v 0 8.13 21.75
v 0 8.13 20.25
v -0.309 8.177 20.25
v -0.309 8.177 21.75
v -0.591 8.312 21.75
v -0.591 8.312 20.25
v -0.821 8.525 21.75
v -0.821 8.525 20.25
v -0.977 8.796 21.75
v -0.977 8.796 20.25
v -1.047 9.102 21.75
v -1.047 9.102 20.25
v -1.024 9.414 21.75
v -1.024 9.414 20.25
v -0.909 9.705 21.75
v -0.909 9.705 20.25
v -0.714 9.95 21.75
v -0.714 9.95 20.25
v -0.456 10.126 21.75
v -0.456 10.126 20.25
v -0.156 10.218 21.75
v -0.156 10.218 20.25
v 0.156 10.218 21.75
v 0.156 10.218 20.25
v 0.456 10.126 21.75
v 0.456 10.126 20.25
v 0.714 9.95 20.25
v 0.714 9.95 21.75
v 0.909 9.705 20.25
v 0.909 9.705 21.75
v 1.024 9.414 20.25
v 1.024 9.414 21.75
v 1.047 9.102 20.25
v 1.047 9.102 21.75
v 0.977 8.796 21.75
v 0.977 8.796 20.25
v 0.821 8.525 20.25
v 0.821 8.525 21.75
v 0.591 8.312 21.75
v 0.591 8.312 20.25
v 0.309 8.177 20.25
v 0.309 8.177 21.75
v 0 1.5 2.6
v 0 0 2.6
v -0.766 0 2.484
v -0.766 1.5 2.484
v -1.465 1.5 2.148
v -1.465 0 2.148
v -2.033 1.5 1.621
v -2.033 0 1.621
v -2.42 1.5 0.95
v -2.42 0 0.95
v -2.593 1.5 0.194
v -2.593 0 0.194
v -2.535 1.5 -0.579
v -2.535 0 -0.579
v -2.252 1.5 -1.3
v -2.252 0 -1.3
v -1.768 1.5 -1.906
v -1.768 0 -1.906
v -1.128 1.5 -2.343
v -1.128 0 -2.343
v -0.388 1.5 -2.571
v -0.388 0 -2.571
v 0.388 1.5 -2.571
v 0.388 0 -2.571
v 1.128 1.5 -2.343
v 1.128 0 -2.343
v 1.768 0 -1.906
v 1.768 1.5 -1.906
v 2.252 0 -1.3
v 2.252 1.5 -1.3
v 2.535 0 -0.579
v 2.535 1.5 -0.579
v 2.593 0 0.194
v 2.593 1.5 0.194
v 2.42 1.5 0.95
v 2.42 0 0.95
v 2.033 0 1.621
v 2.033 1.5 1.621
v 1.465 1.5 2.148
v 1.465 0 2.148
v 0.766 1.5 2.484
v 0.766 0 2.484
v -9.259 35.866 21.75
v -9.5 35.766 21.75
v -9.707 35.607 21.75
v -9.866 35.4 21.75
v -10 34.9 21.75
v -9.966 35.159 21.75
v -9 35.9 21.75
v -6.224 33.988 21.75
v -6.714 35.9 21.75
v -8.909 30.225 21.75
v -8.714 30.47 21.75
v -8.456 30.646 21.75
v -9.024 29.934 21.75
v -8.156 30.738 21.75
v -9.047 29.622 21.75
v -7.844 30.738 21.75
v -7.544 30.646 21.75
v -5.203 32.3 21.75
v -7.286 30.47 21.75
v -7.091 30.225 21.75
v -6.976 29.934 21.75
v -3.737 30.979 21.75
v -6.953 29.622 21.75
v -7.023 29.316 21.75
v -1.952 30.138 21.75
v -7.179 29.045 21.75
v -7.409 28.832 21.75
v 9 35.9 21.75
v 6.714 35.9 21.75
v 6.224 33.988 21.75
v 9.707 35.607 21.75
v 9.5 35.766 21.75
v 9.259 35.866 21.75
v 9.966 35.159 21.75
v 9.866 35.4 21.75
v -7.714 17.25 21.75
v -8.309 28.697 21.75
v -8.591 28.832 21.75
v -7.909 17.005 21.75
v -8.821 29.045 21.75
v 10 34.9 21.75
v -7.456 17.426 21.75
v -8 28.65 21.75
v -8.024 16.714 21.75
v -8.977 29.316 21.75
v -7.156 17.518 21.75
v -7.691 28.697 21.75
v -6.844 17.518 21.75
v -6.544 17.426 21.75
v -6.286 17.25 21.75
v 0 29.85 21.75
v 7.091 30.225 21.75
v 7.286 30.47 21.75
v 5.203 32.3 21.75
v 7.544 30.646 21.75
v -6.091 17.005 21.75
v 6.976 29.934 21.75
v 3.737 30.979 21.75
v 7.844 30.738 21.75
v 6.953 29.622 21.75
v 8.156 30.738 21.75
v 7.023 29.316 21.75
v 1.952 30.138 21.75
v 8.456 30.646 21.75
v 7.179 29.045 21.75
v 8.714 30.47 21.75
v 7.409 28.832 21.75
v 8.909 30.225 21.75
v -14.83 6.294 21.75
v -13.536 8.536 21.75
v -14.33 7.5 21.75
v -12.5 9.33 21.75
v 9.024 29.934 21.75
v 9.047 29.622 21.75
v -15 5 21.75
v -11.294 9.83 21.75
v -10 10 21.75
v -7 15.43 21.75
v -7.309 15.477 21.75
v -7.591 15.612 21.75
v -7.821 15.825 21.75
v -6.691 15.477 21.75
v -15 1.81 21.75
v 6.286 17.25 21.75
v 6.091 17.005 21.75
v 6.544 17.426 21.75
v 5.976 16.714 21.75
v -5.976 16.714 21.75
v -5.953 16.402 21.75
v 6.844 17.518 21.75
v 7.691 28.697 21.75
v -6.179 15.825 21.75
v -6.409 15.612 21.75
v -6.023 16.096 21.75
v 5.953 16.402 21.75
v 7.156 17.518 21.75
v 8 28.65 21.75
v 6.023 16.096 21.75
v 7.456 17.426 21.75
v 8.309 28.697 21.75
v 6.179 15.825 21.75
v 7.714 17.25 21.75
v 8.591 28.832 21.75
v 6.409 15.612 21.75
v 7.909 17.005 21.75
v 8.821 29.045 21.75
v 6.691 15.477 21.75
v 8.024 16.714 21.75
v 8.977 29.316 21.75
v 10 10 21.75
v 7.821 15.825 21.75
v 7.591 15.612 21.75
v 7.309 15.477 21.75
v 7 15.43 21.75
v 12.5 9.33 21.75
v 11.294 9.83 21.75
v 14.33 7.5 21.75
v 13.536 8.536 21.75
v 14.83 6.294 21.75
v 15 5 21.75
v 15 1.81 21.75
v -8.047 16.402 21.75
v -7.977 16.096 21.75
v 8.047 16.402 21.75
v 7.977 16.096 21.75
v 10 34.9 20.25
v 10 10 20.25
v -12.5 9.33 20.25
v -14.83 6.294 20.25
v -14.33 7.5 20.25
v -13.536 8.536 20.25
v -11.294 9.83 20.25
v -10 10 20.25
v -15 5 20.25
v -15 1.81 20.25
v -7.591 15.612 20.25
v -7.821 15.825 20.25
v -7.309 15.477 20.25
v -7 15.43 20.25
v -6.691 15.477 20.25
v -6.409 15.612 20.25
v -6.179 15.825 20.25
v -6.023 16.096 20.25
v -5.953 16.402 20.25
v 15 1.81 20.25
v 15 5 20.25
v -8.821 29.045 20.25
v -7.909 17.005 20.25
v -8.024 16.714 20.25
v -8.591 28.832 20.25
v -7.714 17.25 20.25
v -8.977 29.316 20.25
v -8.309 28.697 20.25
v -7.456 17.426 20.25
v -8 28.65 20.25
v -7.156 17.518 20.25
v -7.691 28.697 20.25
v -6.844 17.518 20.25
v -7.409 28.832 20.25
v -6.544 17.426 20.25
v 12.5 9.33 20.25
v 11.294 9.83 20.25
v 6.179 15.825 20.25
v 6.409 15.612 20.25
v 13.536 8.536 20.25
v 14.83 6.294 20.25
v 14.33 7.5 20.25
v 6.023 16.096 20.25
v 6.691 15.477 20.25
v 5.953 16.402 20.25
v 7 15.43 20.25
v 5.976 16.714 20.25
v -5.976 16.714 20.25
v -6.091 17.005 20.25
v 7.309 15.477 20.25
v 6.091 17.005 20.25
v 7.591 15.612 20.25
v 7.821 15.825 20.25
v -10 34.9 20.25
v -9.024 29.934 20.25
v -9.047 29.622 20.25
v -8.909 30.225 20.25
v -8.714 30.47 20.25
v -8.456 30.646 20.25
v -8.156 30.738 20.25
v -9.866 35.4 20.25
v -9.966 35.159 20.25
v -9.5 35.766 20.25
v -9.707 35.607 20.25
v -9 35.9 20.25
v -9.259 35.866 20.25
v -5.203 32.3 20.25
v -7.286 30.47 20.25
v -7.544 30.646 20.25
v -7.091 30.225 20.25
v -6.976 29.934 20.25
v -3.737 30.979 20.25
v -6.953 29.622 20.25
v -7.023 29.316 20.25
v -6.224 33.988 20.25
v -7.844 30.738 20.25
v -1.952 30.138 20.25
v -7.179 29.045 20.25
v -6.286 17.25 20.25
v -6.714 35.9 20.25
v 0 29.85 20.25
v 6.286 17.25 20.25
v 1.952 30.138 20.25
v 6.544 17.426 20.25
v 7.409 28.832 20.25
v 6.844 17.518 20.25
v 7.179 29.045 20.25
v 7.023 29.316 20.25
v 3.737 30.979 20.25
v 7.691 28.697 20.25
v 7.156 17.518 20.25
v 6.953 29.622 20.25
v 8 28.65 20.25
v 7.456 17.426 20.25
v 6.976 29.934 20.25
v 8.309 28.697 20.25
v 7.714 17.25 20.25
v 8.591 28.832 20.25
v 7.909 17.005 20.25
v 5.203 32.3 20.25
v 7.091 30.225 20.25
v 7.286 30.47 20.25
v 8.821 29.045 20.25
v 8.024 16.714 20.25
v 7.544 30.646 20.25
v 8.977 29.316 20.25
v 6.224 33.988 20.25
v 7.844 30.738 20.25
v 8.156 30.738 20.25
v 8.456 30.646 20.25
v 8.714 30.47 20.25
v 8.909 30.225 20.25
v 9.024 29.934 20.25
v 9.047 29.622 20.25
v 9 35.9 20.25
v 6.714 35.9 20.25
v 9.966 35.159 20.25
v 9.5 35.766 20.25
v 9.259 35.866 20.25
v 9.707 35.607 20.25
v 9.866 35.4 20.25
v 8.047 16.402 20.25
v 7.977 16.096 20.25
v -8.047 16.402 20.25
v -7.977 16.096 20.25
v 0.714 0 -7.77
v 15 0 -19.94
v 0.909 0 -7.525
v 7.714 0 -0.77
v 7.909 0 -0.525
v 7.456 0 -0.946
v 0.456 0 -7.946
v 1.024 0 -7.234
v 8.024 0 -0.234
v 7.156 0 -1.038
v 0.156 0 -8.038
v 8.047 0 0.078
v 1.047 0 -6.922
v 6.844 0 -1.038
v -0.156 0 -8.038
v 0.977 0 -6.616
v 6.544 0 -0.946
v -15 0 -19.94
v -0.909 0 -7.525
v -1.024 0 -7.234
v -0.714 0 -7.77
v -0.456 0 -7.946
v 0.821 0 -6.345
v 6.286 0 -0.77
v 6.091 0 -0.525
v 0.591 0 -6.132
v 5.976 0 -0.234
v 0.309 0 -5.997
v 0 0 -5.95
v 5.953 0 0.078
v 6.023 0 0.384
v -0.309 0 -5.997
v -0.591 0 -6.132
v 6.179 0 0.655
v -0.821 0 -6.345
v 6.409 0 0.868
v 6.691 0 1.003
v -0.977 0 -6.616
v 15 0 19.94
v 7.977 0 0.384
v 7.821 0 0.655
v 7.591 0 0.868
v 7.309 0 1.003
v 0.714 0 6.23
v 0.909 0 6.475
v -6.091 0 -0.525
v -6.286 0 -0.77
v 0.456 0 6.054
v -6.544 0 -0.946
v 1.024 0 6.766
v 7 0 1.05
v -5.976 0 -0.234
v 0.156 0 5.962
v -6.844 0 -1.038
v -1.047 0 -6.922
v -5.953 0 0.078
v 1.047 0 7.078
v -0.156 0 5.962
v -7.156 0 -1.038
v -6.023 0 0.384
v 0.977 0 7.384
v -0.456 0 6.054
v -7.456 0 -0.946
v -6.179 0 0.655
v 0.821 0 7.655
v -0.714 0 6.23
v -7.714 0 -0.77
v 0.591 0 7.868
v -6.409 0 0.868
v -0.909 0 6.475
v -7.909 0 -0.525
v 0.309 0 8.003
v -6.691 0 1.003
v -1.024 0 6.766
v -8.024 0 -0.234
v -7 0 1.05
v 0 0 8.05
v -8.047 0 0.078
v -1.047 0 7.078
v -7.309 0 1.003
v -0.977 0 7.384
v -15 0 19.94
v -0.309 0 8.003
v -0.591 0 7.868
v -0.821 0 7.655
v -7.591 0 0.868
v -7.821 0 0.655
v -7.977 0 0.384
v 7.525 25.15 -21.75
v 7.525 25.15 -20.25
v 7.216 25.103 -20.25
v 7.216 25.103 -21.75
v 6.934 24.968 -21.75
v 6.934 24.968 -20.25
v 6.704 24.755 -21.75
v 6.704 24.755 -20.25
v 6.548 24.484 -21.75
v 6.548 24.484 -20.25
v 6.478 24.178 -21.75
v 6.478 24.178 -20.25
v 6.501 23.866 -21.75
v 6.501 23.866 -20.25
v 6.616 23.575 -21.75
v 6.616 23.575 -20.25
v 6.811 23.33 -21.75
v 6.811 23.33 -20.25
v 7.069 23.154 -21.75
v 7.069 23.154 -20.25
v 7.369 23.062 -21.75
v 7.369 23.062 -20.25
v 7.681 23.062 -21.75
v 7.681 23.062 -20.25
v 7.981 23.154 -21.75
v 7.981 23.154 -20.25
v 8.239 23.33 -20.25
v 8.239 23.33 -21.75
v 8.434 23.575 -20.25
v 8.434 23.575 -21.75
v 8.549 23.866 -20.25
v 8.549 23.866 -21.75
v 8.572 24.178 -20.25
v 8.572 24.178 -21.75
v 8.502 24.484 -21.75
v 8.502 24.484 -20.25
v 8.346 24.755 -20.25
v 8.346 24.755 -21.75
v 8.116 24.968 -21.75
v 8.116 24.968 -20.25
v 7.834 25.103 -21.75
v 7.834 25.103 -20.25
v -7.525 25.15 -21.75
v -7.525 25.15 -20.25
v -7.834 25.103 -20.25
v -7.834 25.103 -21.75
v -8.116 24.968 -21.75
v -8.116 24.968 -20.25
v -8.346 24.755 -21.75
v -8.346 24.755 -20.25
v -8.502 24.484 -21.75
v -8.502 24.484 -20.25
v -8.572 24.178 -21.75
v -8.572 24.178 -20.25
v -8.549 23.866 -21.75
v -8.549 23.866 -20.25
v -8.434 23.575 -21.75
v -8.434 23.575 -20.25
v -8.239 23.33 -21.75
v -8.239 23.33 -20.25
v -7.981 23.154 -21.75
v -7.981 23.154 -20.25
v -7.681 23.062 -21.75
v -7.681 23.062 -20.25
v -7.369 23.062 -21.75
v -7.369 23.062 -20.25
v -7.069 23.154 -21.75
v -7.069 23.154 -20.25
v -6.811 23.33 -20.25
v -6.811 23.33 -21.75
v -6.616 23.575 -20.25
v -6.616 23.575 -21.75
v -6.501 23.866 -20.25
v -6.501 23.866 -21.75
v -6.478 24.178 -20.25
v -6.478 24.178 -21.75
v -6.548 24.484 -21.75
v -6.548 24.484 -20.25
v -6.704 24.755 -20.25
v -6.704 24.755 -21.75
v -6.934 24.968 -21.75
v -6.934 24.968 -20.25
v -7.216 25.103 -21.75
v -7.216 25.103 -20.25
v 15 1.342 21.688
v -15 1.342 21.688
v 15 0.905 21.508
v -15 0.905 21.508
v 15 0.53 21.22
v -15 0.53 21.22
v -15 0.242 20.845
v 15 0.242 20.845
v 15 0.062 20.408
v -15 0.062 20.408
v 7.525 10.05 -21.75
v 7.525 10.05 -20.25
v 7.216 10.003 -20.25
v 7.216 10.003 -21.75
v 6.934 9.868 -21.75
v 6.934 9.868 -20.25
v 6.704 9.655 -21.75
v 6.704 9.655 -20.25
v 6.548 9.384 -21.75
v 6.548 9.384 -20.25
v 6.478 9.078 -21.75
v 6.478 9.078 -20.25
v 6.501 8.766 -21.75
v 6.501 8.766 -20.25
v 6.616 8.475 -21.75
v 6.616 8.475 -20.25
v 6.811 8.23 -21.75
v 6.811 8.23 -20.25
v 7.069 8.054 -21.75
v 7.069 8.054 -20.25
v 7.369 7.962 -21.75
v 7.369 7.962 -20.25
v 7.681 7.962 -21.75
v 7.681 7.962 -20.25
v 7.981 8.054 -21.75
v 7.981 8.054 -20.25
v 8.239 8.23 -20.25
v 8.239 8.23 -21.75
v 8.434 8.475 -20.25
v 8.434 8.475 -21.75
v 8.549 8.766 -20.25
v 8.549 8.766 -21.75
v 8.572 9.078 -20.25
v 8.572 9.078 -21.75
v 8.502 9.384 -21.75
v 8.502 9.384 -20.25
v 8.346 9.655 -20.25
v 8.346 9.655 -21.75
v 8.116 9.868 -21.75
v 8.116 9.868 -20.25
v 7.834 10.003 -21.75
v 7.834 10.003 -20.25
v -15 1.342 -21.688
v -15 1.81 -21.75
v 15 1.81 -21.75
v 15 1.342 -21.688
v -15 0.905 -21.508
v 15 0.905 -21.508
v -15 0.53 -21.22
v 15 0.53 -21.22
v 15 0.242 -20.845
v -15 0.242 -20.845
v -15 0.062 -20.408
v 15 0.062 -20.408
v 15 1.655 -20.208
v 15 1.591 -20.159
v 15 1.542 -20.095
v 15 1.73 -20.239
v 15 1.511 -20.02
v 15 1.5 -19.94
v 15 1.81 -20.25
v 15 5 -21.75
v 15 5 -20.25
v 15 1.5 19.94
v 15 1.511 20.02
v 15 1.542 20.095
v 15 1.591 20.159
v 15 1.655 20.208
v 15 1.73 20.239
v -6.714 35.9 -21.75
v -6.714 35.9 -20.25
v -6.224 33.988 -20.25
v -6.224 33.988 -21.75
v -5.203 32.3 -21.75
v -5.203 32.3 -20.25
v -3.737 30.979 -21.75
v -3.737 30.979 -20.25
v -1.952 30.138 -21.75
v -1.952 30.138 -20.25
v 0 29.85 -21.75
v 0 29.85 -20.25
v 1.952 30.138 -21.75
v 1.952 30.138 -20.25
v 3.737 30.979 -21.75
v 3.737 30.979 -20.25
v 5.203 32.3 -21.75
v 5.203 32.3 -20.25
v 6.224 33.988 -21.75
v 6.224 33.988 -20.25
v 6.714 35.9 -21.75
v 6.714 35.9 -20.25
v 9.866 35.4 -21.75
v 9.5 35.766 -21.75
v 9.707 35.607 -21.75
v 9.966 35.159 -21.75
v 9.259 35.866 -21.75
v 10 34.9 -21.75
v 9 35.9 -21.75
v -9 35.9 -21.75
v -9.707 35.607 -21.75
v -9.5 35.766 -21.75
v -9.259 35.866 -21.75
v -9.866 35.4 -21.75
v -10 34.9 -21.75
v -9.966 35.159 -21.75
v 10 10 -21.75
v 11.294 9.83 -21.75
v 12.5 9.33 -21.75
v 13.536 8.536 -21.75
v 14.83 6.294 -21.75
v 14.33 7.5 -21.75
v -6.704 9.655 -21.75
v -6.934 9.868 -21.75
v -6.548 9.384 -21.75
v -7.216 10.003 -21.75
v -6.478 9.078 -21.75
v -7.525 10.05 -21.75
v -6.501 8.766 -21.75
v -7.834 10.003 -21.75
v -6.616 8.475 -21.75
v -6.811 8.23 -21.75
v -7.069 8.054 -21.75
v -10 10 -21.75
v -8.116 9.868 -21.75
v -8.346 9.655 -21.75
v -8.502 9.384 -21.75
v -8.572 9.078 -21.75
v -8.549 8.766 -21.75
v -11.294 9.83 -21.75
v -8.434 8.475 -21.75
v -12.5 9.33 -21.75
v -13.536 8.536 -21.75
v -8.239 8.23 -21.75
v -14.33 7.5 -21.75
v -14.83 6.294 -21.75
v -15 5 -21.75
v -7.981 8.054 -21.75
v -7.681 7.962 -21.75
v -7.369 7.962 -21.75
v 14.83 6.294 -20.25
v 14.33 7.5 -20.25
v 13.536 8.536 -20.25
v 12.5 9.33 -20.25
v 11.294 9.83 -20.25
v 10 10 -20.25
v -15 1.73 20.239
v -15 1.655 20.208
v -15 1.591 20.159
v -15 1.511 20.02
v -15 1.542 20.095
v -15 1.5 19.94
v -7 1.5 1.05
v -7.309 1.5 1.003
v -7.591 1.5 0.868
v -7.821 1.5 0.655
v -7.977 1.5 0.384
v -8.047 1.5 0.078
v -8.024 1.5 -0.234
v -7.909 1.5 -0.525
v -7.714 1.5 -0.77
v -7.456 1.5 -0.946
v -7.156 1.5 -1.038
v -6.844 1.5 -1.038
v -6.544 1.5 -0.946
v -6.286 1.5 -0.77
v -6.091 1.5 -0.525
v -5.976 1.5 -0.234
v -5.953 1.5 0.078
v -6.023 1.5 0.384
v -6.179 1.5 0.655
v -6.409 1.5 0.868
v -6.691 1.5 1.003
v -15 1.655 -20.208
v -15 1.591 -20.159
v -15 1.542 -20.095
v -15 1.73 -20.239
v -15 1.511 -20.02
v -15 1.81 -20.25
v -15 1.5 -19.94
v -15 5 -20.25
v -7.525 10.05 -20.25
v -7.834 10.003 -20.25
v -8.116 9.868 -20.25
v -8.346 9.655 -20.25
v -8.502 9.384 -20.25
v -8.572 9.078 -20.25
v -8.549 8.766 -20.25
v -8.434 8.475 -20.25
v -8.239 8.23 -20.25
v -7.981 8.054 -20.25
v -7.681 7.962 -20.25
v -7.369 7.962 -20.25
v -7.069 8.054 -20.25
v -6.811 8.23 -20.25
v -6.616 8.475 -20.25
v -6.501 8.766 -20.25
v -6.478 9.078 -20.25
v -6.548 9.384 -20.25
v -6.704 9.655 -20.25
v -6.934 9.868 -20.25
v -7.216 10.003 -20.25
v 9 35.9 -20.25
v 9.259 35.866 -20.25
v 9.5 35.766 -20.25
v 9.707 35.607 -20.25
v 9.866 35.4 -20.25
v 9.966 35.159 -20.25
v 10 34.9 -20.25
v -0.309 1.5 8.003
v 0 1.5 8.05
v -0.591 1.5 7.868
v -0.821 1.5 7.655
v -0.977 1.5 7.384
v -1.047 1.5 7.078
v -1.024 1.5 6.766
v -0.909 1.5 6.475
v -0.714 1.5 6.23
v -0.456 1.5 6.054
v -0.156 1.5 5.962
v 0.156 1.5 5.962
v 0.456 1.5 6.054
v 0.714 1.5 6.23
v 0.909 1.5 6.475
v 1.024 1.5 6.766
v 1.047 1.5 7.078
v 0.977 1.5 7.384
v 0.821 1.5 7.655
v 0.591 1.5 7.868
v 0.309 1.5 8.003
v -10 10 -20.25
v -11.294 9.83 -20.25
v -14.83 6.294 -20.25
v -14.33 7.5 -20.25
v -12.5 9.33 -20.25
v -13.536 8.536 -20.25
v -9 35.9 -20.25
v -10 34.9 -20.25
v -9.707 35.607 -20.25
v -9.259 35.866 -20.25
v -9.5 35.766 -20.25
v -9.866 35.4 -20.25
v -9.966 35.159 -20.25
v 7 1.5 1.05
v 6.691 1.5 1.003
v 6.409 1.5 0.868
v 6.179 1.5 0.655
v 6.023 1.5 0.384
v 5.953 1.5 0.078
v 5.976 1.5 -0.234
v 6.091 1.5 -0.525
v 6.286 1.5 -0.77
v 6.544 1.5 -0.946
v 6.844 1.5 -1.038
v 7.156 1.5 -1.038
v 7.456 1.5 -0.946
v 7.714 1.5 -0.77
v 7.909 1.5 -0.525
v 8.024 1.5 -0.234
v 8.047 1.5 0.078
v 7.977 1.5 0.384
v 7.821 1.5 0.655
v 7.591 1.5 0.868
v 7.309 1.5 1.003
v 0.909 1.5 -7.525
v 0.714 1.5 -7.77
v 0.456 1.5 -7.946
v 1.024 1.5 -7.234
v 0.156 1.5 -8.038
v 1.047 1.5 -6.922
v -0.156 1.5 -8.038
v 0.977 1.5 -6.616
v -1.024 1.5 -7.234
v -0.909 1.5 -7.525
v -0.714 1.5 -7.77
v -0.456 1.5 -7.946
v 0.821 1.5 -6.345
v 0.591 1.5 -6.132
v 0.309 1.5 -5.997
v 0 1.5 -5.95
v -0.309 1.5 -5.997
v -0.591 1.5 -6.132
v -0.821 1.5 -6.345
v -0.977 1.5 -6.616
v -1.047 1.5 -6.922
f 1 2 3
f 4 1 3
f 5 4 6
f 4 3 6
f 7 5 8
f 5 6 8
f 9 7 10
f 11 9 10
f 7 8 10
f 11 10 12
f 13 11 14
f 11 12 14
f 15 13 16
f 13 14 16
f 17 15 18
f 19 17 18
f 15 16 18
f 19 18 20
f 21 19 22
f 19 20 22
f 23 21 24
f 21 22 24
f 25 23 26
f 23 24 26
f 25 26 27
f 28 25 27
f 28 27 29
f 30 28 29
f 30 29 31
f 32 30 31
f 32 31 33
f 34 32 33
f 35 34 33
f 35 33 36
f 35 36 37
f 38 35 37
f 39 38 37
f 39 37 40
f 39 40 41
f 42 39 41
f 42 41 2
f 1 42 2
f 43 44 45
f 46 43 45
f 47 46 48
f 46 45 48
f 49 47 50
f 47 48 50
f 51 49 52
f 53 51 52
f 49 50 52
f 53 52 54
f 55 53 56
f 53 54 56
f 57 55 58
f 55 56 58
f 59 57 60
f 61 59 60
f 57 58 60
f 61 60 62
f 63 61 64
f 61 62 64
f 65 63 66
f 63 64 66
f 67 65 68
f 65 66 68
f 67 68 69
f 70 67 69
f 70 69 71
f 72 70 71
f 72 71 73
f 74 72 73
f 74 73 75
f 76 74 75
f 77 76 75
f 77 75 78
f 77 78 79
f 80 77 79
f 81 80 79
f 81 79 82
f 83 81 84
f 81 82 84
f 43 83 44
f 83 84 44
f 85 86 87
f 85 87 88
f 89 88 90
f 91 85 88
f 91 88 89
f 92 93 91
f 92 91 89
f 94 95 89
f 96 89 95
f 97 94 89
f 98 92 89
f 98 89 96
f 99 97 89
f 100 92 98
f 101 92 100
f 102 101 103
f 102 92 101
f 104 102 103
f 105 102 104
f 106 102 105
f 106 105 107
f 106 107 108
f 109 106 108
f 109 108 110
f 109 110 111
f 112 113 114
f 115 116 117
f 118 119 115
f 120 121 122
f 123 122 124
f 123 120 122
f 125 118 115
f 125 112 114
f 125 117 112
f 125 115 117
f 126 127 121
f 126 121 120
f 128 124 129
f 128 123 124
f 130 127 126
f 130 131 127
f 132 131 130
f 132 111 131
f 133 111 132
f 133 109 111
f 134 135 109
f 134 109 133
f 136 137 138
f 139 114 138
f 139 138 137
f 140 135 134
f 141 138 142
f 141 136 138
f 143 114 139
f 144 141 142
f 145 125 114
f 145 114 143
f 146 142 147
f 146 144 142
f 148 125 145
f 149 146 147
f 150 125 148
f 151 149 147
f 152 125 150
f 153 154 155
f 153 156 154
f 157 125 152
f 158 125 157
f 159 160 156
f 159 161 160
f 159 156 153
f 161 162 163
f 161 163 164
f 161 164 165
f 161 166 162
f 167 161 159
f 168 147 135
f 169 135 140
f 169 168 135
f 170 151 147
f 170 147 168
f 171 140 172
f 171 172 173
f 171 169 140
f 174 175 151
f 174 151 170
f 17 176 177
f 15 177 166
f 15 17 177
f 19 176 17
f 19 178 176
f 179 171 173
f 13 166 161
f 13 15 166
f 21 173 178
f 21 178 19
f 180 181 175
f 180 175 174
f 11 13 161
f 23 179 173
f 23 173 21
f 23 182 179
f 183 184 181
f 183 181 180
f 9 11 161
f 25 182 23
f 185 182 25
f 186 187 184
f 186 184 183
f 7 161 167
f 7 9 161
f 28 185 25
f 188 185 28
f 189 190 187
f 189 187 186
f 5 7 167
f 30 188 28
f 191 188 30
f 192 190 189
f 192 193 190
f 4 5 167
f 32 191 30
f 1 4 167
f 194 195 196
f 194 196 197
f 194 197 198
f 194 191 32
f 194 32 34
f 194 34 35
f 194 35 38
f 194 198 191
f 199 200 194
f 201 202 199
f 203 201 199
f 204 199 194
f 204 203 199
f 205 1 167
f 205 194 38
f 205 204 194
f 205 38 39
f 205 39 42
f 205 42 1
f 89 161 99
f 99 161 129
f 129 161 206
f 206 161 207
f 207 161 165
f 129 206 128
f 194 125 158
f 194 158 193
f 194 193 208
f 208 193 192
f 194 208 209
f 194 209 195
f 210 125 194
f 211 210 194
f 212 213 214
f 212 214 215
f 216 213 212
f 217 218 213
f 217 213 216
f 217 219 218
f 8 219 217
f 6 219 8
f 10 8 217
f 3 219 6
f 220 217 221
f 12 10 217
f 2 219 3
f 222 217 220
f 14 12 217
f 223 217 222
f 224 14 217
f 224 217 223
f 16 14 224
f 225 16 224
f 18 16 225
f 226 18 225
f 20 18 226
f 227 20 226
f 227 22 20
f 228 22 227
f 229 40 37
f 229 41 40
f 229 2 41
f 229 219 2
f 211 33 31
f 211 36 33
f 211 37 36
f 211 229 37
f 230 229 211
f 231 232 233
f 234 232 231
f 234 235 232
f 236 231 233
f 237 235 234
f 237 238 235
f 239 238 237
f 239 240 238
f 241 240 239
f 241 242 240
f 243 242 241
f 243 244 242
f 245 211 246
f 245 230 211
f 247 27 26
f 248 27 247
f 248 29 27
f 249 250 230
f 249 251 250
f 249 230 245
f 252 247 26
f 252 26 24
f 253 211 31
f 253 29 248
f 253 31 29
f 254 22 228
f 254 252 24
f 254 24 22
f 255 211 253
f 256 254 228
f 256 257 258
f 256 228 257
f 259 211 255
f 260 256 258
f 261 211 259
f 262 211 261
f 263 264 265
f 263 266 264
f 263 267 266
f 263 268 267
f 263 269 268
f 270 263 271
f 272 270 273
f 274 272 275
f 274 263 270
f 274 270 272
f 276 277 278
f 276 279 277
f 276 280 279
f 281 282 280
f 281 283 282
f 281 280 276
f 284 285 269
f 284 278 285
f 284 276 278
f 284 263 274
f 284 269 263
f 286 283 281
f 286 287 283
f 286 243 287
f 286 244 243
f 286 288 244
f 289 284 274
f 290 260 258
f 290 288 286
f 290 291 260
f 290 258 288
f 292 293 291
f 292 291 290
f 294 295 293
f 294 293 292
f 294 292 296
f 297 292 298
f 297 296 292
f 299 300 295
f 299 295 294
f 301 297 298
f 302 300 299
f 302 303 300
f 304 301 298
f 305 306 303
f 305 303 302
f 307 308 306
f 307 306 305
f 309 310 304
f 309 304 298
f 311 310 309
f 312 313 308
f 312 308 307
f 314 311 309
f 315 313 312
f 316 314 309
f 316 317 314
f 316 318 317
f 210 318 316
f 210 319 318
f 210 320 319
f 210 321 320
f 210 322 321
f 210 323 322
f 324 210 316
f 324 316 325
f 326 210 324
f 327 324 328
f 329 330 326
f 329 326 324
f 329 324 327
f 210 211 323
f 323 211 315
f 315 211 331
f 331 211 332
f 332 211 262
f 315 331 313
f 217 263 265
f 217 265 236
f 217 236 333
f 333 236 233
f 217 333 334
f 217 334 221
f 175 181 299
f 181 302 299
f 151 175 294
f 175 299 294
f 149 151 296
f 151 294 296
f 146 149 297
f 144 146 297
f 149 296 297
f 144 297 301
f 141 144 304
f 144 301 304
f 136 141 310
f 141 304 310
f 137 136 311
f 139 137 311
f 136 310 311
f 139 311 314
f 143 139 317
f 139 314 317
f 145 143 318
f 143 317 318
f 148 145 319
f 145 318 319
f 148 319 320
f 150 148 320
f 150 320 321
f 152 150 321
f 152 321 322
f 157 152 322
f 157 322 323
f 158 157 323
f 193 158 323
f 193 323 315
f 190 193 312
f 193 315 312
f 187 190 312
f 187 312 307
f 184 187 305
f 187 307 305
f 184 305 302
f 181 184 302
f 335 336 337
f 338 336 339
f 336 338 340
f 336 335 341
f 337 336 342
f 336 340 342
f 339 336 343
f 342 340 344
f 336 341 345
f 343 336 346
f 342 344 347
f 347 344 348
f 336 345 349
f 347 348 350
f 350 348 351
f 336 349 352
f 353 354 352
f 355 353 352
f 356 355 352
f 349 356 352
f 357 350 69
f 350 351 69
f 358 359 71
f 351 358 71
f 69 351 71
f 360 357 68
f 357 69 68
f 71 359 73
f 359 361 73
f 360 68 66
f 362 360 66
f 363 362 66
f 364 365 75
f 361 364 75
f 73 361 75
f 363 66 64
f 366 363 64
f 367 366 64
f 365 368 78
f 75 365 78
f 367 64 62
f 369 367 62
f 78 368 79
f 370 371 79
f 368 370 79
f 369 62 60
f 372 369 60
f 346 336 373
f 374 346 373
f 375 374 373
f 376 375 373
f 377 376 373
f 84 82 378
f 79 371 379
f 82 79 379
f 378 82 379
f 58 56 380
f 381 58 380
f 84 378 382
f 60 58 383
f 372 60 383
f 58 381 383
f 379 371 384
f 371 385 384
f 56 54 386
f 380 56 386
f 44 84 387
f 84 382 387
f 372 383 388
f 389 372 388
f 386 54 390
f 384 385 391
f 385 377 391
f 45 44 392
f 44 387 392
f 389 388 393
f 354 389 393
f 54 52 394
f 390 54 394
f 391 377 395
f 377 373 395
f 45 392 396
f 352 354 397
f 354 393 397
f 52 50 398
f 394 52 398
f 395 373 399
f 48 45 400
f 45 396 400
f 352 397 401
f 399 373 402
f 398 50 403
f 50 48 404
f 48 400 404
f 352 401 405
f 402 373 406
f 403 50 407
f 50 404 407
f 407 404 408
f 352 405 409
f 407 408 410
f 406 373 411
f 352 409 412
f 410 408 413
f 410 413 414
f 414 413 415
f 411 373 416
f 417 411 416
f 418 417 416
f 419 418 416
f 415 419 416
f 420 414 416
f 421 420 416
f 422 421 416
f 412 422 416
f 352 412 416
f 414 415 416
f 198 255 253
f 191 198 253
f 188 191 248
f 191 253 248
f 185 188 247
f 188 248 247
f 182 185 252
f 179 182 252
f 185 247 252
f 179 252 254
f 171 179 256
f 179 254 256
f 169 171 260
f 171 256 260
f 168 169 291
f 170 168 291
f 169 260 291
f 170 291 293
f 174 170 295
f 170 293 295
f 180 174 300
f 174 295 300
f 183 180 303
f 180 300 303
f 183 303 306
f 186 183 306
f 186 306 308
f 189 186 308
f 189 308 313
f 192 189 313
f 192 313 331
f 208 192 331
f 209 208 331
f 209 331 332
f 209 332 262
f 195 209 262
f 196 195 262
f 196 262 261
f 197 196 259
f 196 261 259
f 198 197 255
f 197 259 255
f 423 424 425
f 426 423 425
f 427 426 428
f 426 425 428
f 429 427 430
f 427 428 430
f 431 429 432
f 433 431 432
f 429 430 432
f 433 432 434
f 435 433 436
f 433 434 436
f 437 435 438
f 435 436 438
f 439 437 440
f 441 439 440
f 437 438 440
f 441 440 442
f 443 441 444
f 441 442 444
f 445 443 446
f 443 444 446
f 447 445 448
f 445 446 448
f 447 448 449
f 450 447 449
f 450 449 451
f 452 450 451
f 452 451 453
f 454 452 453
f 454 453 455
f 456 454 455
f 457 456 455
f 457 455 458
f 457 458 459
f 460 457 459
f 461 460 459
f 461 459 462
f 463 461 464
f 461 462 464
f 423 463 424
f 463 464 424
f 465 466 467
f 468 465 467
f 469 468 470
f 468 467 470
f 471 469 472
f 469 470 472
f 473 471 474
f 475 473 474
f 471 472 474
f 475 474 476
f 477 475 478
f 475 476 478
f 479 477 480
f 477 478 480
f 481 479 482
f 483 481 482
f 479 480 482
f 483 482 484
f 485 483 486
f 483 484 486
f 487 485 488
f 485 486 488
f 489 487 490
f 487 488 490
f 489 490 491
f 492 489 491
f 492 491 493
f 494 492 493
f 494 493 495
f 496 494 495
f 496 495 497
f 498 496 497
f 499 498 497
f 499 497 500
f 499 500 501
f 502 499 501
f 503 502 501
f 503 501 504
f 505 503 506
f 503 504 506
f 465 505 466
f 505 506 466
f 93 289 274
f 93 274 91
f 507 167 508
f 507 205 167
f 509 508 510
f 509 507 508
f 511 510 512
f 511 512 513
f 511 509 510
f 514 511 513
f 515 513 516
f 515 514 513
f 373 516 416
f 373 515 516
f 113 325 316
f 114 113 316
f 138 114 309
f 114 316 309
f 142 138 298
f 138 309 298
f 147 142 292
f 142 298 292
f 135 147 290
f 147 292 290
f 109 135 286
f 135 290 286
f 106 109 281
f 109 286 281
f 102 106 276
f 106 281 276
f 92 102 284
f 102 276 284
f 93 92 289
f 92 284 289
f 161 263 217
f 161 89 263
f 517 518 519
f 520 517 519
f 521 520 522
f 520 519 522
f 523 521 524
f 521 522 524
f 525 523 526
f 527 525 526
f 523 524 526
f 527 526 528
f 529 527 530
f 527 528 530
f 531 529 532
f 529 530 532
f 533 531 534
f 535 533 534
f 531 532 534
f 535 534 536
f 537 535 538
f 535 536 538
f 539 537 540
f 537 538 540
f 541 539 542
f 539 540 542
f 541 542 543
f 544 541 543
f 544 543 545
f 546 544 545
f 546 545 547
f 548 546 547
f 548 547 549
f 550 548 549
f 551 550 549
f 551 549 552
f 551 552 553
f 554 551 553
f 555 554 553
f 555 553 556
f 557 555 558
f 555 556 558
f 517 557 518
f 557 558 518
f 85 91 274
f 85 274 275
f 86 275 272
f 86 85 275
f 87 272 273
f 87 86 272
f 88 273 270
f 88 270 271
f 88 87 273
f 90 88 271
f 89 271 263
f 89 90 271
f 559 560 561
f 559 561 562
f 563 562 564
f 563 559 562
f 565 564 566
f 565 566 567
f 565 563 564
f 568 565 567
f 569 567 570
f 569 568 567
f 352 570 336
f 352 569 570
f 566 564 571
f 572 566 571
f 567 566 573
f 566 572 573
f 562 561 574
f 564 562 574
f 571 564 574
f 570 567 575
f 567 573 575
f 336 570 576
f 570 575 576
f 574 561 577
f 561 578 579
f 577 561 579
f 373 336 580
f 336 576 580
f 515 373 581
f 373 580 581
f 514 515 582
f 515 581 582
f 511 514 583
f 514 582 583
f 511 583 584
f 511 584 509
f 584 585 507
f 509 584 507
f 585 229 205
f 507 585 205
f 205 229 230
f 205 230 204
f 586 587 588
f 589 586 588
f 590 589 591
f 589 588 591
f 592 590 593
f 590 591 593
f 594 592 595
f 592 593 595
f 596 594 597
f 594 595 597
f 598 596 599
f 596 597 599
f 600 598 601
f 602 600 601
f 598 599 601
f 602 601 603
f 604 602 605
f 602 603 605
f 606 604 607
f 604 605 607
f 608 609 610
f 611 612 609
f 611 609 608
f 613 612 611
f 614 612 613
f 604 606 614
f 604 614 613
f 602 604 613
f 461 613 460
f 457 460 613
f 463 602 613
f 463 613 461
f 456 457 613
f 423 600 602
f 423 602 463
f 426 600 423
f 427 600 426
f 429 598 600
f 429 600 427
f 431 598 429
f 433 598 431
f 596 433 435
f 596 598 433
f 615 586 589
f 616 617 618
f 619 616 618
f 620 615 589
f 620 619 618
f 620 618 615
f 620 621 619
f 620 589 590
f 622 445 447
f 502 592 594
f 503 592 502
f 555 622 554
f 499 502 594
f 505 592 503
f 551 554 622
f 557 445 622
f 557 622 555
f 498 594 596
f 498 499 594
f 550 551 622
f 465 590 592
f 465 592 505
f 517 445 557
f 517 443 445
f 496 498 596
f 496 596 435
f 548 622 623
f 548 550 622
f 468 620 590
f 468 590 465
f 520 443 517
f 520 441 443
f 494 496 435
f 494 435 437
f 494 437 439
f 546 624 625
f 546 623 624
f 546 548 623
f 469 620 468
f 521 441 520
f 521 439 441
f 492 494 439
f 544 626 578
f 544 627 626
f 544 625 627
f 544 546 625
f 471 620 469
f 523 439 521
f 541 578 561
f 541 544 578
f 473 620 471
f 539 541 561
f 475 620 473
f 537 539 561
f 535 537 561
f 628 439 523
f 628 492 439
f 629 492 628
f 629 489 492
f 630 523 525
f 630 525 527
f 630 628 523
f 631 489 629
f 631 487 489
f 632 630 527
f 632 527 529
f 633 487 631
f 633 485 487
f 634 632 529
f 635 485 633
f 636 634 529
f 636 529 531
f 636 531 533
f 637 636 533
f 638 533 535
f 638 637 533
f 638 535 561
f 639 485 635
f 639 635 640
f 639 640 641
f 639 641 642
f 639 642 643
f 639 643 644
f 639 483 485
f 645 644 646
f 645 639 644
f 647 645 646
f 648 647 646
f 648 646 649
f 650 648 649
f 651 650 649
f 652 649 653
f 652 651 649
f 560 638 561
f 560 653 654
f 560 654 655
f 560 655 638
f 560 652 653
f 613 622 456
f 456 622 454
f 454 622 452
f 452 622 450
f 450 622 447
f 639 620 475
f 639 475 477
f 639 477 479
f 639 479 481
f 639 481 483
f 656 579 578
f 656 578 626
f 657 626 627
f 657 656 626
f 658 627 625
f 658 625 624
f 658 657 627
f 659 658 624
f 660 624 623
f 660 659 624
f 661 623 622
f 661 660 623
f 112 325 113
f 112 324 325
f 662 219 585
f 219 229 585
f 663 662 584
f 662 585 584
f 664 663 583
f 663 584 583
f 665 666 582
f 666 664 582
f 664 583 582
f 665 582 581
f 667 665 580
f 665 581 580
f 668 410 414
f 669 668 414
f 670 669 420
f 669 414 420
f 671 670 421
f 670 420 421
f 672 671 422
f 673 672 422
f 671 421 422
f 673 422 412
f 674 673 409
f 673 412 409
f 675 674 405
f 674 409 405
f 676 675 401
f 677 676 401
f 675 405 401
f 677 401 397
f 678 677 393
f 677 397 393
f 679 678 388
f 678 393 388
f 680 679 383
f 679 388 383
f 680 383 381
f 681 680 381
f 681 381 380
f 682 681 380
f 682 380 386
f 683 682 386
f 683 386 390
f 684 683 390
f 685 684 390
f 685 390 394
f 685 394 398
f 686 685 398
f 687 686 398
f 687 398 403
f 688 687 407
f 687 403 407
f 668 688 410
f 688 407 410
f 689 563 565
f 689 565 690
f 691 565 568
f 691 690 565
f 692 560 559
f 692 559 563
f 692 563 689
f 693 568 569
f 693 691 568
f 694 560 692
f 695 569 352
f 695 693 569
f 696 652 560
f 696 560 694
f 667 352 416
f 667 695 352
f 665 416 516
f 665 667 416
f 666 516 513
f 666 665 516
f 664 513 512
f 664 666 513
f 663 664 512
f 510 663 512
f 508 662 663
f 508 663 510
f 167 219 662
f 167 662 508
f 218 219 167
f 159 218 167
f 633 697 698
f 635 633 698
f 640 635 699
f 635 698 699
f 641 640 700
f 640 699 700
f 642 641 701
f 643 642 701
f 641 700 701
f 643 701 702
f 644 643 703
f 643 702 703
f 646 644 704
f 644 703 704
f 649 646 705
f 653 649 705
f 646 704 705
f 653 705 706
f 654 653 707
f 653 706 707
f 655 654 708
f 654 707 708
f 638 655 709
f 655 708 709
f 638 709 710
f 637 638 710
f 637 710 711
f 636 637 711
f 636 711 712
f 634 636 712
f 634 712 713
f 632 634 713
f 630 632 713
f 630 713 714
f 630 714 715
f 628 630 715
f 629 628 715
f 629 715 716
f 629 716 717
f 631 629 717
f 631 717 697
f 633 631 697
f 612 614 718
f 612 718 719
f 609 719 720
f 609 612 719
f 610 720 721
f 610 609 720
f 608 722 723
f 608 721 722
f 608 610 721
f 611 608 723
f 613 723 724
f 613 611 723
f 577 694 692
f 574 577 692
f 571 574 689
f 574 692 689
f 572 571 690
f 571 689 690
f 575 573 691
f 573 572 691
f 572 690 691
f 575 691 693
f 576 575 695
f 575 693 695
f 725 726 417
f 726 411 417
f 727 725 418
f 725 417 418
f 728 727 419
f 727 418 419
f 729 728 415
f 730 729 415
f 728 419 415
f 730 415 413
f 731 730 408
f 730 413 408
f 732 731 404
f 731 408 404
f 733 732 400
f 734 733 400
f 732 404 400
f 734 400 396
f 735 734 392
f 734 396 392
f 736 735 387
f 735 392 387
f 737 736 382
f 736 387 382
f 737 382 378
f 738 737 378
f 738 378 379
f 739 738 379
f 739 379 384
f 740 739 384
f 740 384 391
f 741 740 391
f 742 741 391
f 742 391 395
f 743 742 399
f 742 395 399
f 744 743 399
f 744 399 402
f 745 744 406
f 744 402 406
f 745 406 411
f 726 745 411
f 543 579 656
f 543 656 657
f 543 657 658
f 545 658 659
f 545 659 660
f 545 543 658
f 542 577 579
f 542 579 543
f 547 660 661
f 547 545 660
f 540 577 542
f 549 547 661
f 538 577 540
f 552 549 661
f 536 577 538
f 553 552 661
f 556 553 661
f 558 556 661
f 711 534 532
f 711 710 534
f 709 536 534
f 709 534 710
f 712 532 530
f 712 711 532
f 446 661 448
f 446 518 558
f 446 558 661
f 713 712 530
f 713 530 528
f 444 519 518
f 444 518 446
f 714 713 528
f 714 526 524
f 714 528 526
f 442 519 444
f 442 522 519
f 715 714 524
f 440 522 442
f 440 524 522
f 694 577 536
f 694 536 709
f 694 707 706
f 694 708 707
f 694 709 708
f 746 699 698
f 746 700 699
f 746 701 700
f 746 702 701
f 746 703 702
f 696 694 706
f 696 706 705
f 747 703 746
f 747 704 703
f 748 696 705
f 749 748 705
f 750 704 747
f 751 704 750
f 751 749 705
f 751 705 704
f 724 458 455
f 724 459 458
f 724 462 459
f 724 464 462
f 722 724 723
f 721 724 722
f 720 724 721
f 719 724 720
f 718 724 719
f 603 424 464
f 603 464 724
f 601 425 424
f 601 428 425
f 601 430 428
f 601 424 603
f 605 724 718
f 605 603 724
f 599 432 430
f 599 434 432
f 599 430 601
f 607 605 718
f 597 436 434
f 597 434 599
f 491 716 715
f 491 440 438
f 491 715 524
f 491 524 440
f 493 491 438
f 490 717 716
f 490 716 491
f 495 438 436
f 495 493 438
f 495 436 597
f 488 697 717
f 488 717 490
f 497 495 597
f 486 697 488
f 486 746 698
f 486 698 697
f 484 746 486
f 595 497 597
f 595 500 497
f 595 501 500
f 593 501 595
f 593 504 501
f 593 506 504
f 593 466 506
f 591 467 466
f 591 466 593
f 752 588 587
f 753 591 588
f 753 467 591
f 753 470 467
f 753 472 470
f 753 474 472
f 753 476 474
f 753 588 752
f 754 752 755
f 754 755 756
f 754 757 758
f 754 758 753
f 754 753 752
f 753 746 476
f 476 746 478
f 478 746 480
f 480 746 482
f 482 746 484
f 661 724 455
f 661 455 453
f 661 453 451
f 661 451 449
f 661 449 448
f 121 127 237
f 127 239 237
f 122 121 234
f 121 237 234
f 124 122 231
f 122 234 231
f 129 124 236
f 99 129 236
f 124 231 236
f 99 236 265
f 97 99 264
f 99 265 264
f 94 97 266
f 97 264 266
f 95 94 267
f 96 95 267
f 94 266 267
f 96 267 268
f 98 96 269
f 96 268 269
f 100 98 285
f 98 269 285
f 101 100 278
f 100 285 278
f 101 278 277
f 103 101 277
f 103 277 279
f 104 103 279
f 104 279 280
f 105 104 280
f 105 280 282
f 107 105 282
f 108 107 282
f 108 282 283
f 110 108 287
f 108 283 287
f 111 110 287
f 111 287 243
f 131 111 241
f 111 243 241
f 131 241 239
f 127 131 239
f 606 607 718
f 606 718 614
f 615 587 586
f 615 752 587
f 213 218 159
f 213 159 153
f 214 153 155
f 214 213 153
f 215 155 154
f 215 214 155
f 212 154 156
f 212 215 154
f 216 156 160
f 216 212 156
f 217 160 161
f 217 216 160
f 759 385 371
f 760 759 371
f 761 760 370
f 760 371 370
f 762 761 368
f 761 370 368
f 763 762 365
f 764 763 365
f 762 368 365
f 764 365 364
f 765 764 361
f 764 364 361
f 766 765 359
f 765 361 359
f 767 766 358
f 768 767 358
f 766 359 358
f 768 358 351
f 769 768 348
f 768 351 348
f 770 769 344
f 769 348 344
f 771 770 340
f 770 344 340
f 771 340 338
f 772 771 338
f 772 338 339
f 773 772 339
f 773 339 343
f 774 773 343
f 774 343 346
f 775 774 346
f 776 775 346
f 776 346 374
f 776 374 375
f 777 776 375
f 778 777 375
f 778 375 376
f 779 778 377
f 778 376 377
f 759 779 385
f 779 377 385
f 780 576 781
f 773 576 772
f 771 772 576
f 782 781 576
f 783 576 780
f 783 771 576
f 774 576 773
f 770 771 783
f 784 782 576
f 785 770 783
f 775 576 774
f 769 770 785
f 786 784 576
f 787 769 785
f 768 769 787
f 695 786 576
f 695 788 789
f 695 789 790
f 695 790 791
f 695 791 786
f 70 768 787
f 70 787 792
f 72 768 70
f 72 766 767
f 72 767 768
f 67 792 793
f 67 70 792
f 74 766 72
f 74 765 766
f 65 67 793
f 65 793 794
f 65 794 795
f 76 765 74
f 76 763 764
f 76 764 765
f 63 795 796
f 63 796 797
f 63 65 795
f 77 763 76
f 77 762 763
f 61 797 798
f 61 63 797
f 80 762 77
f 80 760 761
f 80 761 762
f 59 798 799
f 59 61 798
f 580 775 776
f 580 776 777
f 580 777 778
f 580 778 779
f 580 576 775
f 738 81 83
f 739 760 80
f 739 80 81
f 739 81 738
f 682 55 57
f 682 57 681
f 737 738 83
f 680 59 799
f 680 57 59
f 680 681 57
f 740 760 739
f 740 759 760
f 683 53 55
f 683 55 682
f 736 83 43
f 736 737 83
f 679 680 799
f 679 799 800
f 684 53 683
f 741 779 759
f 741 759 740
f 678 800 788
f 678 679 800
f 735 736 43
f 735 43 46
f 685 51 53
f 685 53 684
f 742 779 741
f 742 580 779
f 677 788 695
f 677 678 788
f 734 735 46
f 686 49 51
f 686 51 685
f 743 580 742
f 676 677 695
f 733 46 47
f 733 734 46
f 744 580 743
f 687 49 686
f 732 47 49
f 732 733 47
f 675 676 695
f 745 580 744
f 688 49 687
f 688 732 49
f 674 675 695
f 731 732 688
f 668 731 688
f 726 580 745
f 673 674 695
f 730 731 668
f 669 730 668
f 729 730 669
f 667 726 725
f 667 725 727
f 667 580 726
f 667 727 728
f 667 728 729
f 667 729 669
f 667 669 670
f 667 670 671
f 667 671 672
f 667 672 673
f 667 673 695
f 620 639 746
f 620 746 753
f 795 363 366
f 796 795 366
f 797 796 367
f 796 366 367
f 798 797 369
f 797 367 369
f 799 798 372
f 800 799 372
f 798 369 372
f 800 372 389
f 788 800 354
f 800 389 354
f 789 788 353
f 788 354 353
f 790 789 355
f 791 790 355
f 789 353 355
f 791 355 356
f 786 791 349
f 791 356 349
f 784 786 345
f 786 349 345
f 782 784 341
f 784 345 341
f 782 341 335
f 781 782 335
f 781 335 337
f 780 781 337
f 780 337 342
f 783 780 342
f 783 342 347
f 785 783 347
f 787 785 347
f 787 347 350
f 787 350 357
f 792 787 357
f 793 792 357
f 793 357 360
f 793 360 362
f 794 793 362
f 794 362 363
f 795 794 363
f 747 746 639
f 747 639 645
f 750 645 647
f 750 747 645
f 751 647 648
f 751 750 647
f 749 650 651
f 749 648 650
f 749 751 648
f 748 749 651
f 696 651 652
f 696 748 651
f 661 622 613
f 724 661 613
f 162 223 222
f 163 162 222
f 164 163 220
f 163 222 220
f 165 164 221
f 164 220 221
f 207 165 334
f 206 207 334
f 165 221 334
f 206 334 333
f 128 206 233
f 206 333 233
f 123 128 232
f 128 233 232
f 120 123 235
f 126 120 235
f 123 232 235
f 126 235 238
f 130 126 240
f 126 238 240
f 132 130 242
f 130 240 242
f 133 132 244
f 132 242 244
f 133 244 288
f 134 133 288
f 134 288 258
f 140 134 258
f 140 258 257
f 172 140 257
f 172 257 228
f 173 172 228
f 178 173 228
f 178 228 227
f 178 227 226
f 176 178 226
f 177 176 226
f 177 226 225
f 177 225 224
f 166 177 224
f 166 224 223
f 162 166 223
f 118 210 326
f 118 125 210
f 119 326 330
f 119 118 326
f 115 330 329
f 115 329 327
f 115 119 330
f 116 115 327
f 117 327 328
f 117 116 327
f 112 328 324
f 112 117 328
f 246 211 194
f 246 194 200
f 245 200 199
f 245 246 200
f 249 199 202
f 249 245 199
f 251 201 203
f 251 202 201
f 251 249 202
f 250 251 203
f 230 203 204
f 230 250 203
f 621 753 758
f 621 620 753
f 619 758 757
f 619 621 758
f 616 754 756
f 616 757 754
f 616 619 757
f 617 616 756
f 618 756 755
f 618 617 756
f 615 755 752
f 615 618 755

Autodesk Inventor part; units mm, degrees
ref_plane "YZ Plane" through (0, 0, 0) normal (1, 0, 0) x (0, 1, 0)
ref_plane "XZ Plane" through (0, 0, 0) normal (0, 1, 0) x (-1, 0, 0)
ref_plane "XY Plane" through (0, 0, 0) normal (0, 0, 1) x (1, 0, 0)
sketch "Sketch1" plane through (0, 0, 0) normal (0, 1, 0) x (-1, 0, 0)
  line L0 (-15, 20.25) -> (15, 20.25)
  line L1 (15, 20.25) -> (15, -20.25)
  line L2 (15, -20.25) -> (-15, -20.25)
  line L3 (-15, -20.25) -> (-15, 20.25)
  line L4 (-15, 20.25) -> (15, -20.25) construction
  line L5 (15, 20.25) -> (-15, -20.25) construction
  point P0 (0, 0)
  dimension "d0" = 40.5
  dimension "d1" = 30
extrude "Plate1" add sketch "Sketch1" along normal blind 1.5
sketch "Sketch2" plane through (-15, 0, -21.75) normal (0, 0, 1) x (1, 0, 0)
  line L0 (30, 0) -> (0, 0)
  line L1 (0, 0) -> (0, 35.9)
  line L2 (0, 35.9) -> (30, 35.9)
  line L3 (30, 35.9) -> (30, 0)
edge flange "Flange1" height 35.9 angle 90 thickness 1.5 bend radius 0.31 thickness toward (0, 0, 1) relief tear relief width 1.5 relief depth 0.75 corner gap 0.31 corner form 0 edges at (0, 1.5, -20.25) (0, 1.5, 20.25) wall of the first edge with corners at (15, 0, -21.75) (-15, 0, -21.75) (-15, 35.9, -21.75) (15, 35.9, -21.75)
bend "Bend1"
corner "Corner1"
sketch "Sketch3" plane through (0, 1.5, 0) normal (0, 1, 0) x (1, 0, 0)
  circle A0 centre (7, 0) radius 0.7835 projected
  circle A1 centre (0, -7) radius 0.7835 projected
  circle A2 centre (-7, 0) radius 0.7835 projected
  circle A3 centre (0, 7) radius 0.7835 projected
  point P0 (0, 0)
hole "Hole1" at (0, 1.5, 7) at (7, 1.5, 0) at (-7, 1.5, 0) at (0, 1.5, -7) direction (0, -1, 0) diameter 2.1 depth 1.5
sketch "Sketch26" plane through (-15, 35.9, 21.75) normal (0, 0, 1) x (1, 0, 0)
  line L0 (30, 9.1) -> (25, 9.1)
  line L1 (25, 9.1) -> (25, -25.9)
  line L2 (25, -25.9) -> (30, -25.9)
  line L3 (30, -25.9) -> (30, 9.1)
  line L4 (0, 9.1) -> (5, 9.1)
  line L5 (5, 9.1) -> (5, -25.9)
  line L6 (5, -25.9) -> (0, -25.9)
  line L7 (0, -25.9) -> (0, 9.1)
  point P0 (15, -35.9)
  dimension "d91" = 35
  dimension "d92" = 5
  dimension "d93" = 10
  dimension "d94" = 10
  dimension "d95" = 5
  dimension "d96" = 35
  dimension "d97" = 10
  dimension "d98" = 10
extrude "Cut11" cut sketch "Sketch26" against normal blind 1.5
fillet "Corner Round1" radius 5 1 edges at (-15, 10, 21)
fillet "Corner Round2" radius 5 1 edges at (15, 10, 21)
mirror "Mirror1" about plane through (0, 0, 0) normal (0, 0, 1) of "Cut11"
fillet "Corner Round3" radius 5 1 edges at (-15, 10, -21)
fillet "Corner Round4" radius 5 1 edges at (15, 10, -21)
fillet "Corner Round5" radius 1 4 edges at (10, 35.9, -21) (10, 35.9, 21) (-10, 35.9, 21) (-10, 35.9, -21)
sketch "Sketch31" plane through (-15, 1.81, 21.75) normal (0, 0, 1) x (1, 0, 0)
  point P0 (15, -1.81)
sketch "Sketch34" plane through (0, 1.5, 0) normal (0, 1, 0) x (1, 0, 0)
  circle A0 centre (0, 0) radius 1.2295
  point P0 (0, 0)
hole "Hole13" at (0, 1.5, 0) direction (0, -1, 0) diameter 5.2 depth 1.5
sketch "Sketch35" plane through (-15, 1.81, 21.75) normal (0, 0, 1) x (1, 0, 0)
  circle A0 centre (15, 34.79) radius 2.925
  point P0 (15, -1.81)
hole "Hole16" at (0, 36.6, 21.75) direction (0, 0, -1) diameter 13.5 depth 1.5
sketch "Sketch36" plane through (15, 1.81, -21.75) normal (0, 0, -1) x (-1, 0, 0)
  circle A0 centre (15, 34.79) radius 4.48
  point P0 (15, -1.81)
hole "Hole17" at (0, 36.6, -21.75) direction (0, 0, 1) diameter 13.5 depth 1.5
sketch "Sketch37" plane through (-15, 1.81, 21.75) normal (0, 0, 1) x (1, 0, 0)
  circle A0 centre (23, 27.89) radius 0.7835
  circle A1 centre (22, 14.67) radius 0.7835
  circle A2 centre (15, 7.37) radius 0.7835
  circle A3 centre (8, 14.67) radius 0.7835
  circle A4 centre (7, 27.89) radius 0.7835
  point P0 (15, -1.81)
hole "Hole18" at (8, 29.7, 21.75) at (-8, 29.7, 21.75) at (7, 16.48, 21.75) at (-7, 16.48, 21.75) at (0, 9.18, 21.75) direction (0, 0, -1) diameter 2.1 depth 1.5
sketch "Sketch38" plane through (15, 1.81, -21.75) normal (0, 0, -1) x (-1, 0, 0)
  circle A0 centre (7.475, 7.19) radius 0.7835
  circle A1 centre (7.475, 22.29) radius 0.7835
  circle A2 centre (22.525, 7.19) radius 0.7835
  circle A3 centre (22.525, 22.29) radius 0.7835
  point P0 (15, -1.81)
hole "Hole19" at (7.525, 9, -21.75) at (7.525, 24.1, -21.75) at (-7.525, 9, -21.75) at (-7.525, 24.1, -21.75) direction (0, 0, 1) diameter 2.1 depth 1.5
equation "\"d18\" = Thickness"
equation "\"d99\" = Thickness"
equation "\"d143\" = Thickness"
equation "\"d164\" = Thickness"
equation "\"d171\" = Thickness"
equation "\"d178\" = Thickness"
equation "\"d185\" = Thickness"
equation "\"d2\" = Thickness"
equation "\"d3\" = BendReliefWidth"
equation "\"d4\" = BendReliefDepth"
equation "\"d5\" = MinimumRemnant"
equation "\"d6\" = TransitionRadius"
equation "\"d9\" = BendRadius"
equation "\"d10\" = CornerReliefSize"
equation "\"d11\" = GapSize"
equation "\"d12\" = JacobiRadiusSize"
equation "\"BendReliefWidth\" = Thickness"
equation "\"BendReliefDepth\" = 0.5 * Thickness"
equation "\"CornerReliefSize\" = 4 * Thickness"
equation "\"MinimumRemnant\" = 2 * Thickness"
equation "\"TransitionRadius\" = BendRadius"
equation "\"JacobiRadiusSize\" = BendRadius"
equation "\"GapSize\" = Thickness"
equation "\"Thickness\" = 1.5"
equation "\"BendRadius\" = 0.31"
properties part number "axis_19_top_frame" material "Aluminum 6061-AHC"
